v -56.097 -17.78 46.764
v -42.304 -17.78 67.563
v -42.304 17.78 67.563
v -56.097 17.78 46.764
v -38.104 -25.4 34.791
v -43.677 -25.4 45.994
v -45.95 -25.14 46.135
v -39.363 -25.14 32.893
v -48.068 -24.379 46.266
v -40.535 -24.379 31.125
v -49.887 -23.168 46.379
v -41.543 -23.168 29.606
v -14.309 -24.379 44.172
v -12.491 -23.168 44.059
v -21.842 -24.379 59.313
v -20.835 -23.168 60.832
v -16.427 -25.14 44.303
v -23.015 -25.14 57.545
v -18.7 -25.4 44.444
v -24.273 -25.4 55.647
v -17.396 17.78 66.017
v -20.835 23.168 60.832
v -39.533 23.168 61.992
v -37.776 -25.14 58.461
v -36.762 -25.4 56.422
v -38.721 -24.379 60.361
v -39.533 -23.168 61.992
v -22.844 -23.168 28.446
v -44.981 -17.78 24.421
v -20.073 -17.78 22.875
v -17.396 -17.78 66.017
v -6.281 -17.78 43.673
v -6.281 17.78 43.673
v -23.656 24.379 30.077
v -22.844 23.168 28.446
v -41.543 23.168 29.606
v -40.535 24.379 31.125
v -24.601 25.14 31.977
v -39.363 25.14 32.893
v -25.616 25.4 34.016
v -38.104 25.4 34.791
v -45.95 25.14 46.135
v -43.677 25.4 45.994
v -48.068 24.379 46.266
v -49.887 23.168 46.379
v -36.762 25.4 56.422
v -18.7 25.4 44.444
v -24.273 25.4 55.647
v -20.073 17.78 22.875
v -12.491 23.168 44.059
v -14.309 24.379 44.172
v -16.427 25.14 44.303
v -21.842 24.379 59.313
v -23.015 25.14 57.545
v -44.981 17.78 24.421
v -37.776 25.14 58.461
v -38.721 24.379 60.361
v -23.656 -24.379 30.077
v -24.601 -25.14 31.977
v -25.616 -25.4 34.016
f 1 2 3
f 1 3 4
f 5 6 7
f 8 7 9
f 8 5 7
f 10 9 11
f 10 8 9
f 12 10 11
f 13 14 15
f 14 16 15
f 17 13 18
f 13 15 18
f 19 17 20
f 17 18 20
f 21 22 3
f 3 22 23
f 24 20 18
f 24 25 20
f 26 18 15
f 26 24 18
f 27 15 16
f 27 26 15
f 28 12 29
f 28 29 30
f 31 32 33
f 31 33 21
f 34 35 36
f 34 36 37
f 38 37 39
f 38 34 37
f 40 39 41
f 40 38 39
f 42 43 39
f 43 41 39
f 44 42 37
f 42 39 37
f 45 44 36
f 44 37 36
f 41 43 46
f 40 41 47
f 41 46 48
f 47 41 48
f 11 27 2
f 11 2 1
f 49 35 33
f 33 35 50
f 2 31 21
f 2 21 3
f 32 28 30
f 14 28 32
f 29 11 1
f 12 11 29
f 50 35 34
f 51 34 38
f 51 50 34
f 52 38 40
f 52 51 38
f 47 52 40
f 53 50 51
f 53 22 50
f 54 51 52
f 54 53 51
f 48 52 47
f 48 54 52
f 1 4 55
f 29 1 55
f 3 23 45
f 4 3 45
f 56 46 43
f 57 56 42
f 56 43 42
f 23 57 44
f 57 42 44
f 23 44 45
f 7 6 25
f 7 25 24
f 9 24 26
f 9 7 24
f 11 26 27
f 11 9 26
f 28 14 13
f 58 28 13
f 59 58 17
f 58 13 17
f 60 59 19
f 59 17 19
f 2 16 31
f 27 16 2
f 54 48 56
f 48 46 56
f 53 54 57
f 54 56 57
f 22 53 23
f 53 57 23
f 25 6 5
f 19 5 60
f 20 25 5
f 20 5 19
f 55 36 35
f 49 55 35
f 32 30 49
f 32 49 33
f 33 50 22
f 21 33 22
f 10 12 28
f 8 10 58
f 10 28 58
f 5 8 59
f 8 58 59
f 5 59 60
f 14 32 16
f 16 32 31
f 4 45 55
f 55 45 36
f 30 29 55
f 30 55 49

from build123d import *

# Parameters (mm, degrees)
F1_DEPTH      = 25.4
F1_DEPTH_BACK = 25.4
F2_SIZE       = 7.62
F3_R          = 7.62
F4_R          = 7.62


with BuildPart() as f1:
    # F0 (on Front) → F1 (new body, two sides)
    with BuildSketch(Plane.XZ) as f1_sk:
        Polygon((-20.073232, 22.875223), (-6.280771, 43.673378), (-17.396271, 66.017077), (-42.304232, 67.562621), (-56.096693, 46.764467), (-44.981193, 24.420768), align=None)
    extrude(amount=F1_DEPTH)
    extrude(f1_sk.sketch, amount=-F1_DEPTH_BACK)

    # F2
    f2_edges = [f1.edges().sort_by_distance(p)[0] for p in [
        (-29.850251, -25.4, 66.789849),
        (-11.838521, -25.4, 54.845227),
        (-13.177002, -25.4, 33.2743),
        (-49.200462, -25.4, 57.163544),
        (-50.538943, -25.4, 35.592617),
        (-32.527213, -25.4, 23.647995),
        (-13.177002, 25.4, 33.2743),
        (-11.838521, 25.4, 54.845227),
        (-29.850251, 25.4, 66.789849),
        (-49.200462, 25.4, 57.163544),
        (-50.538943, 25.4, 35.592617),
        (-32.527213, 25.4, 23.647995),
    ]]
    chamfer(f2_edges, length=F2_SIZE)

    # F3
    f3_edges = [f1.edges().sort_by_distance(p)[0] for p in [
        (-30.322166, -25.4, 59.184476),
        (-18.660925, -25.4, 51.451231),
        (-42.849974, -25.4, 52.952167),
        (-19.52749, -25.4, 37.485677),
        (-43.716539, -25.4, 38.986613),
        (-32.055298, -25.4, 31.253368),
    ]]
    fillet(f3_edges, radius=F3_R)

    # F4
    f4_edges = [f1.edges().sort_by_distance(p)[0] for p in [
        (-19.52749, 25.4, 37.485677),
        (-32.055298, 25.4, 31.253368),
        (-18.660925, 25.4, 51.451231),
        (-43.716539, 25.4, 38.986613),
        (-30.322166, 25.4, 59.184476),
        (-42.849974, 25.4, 52.952167),
    ]]
    fillet(f4_edges, radius=F4_R)


solid = f1.part
